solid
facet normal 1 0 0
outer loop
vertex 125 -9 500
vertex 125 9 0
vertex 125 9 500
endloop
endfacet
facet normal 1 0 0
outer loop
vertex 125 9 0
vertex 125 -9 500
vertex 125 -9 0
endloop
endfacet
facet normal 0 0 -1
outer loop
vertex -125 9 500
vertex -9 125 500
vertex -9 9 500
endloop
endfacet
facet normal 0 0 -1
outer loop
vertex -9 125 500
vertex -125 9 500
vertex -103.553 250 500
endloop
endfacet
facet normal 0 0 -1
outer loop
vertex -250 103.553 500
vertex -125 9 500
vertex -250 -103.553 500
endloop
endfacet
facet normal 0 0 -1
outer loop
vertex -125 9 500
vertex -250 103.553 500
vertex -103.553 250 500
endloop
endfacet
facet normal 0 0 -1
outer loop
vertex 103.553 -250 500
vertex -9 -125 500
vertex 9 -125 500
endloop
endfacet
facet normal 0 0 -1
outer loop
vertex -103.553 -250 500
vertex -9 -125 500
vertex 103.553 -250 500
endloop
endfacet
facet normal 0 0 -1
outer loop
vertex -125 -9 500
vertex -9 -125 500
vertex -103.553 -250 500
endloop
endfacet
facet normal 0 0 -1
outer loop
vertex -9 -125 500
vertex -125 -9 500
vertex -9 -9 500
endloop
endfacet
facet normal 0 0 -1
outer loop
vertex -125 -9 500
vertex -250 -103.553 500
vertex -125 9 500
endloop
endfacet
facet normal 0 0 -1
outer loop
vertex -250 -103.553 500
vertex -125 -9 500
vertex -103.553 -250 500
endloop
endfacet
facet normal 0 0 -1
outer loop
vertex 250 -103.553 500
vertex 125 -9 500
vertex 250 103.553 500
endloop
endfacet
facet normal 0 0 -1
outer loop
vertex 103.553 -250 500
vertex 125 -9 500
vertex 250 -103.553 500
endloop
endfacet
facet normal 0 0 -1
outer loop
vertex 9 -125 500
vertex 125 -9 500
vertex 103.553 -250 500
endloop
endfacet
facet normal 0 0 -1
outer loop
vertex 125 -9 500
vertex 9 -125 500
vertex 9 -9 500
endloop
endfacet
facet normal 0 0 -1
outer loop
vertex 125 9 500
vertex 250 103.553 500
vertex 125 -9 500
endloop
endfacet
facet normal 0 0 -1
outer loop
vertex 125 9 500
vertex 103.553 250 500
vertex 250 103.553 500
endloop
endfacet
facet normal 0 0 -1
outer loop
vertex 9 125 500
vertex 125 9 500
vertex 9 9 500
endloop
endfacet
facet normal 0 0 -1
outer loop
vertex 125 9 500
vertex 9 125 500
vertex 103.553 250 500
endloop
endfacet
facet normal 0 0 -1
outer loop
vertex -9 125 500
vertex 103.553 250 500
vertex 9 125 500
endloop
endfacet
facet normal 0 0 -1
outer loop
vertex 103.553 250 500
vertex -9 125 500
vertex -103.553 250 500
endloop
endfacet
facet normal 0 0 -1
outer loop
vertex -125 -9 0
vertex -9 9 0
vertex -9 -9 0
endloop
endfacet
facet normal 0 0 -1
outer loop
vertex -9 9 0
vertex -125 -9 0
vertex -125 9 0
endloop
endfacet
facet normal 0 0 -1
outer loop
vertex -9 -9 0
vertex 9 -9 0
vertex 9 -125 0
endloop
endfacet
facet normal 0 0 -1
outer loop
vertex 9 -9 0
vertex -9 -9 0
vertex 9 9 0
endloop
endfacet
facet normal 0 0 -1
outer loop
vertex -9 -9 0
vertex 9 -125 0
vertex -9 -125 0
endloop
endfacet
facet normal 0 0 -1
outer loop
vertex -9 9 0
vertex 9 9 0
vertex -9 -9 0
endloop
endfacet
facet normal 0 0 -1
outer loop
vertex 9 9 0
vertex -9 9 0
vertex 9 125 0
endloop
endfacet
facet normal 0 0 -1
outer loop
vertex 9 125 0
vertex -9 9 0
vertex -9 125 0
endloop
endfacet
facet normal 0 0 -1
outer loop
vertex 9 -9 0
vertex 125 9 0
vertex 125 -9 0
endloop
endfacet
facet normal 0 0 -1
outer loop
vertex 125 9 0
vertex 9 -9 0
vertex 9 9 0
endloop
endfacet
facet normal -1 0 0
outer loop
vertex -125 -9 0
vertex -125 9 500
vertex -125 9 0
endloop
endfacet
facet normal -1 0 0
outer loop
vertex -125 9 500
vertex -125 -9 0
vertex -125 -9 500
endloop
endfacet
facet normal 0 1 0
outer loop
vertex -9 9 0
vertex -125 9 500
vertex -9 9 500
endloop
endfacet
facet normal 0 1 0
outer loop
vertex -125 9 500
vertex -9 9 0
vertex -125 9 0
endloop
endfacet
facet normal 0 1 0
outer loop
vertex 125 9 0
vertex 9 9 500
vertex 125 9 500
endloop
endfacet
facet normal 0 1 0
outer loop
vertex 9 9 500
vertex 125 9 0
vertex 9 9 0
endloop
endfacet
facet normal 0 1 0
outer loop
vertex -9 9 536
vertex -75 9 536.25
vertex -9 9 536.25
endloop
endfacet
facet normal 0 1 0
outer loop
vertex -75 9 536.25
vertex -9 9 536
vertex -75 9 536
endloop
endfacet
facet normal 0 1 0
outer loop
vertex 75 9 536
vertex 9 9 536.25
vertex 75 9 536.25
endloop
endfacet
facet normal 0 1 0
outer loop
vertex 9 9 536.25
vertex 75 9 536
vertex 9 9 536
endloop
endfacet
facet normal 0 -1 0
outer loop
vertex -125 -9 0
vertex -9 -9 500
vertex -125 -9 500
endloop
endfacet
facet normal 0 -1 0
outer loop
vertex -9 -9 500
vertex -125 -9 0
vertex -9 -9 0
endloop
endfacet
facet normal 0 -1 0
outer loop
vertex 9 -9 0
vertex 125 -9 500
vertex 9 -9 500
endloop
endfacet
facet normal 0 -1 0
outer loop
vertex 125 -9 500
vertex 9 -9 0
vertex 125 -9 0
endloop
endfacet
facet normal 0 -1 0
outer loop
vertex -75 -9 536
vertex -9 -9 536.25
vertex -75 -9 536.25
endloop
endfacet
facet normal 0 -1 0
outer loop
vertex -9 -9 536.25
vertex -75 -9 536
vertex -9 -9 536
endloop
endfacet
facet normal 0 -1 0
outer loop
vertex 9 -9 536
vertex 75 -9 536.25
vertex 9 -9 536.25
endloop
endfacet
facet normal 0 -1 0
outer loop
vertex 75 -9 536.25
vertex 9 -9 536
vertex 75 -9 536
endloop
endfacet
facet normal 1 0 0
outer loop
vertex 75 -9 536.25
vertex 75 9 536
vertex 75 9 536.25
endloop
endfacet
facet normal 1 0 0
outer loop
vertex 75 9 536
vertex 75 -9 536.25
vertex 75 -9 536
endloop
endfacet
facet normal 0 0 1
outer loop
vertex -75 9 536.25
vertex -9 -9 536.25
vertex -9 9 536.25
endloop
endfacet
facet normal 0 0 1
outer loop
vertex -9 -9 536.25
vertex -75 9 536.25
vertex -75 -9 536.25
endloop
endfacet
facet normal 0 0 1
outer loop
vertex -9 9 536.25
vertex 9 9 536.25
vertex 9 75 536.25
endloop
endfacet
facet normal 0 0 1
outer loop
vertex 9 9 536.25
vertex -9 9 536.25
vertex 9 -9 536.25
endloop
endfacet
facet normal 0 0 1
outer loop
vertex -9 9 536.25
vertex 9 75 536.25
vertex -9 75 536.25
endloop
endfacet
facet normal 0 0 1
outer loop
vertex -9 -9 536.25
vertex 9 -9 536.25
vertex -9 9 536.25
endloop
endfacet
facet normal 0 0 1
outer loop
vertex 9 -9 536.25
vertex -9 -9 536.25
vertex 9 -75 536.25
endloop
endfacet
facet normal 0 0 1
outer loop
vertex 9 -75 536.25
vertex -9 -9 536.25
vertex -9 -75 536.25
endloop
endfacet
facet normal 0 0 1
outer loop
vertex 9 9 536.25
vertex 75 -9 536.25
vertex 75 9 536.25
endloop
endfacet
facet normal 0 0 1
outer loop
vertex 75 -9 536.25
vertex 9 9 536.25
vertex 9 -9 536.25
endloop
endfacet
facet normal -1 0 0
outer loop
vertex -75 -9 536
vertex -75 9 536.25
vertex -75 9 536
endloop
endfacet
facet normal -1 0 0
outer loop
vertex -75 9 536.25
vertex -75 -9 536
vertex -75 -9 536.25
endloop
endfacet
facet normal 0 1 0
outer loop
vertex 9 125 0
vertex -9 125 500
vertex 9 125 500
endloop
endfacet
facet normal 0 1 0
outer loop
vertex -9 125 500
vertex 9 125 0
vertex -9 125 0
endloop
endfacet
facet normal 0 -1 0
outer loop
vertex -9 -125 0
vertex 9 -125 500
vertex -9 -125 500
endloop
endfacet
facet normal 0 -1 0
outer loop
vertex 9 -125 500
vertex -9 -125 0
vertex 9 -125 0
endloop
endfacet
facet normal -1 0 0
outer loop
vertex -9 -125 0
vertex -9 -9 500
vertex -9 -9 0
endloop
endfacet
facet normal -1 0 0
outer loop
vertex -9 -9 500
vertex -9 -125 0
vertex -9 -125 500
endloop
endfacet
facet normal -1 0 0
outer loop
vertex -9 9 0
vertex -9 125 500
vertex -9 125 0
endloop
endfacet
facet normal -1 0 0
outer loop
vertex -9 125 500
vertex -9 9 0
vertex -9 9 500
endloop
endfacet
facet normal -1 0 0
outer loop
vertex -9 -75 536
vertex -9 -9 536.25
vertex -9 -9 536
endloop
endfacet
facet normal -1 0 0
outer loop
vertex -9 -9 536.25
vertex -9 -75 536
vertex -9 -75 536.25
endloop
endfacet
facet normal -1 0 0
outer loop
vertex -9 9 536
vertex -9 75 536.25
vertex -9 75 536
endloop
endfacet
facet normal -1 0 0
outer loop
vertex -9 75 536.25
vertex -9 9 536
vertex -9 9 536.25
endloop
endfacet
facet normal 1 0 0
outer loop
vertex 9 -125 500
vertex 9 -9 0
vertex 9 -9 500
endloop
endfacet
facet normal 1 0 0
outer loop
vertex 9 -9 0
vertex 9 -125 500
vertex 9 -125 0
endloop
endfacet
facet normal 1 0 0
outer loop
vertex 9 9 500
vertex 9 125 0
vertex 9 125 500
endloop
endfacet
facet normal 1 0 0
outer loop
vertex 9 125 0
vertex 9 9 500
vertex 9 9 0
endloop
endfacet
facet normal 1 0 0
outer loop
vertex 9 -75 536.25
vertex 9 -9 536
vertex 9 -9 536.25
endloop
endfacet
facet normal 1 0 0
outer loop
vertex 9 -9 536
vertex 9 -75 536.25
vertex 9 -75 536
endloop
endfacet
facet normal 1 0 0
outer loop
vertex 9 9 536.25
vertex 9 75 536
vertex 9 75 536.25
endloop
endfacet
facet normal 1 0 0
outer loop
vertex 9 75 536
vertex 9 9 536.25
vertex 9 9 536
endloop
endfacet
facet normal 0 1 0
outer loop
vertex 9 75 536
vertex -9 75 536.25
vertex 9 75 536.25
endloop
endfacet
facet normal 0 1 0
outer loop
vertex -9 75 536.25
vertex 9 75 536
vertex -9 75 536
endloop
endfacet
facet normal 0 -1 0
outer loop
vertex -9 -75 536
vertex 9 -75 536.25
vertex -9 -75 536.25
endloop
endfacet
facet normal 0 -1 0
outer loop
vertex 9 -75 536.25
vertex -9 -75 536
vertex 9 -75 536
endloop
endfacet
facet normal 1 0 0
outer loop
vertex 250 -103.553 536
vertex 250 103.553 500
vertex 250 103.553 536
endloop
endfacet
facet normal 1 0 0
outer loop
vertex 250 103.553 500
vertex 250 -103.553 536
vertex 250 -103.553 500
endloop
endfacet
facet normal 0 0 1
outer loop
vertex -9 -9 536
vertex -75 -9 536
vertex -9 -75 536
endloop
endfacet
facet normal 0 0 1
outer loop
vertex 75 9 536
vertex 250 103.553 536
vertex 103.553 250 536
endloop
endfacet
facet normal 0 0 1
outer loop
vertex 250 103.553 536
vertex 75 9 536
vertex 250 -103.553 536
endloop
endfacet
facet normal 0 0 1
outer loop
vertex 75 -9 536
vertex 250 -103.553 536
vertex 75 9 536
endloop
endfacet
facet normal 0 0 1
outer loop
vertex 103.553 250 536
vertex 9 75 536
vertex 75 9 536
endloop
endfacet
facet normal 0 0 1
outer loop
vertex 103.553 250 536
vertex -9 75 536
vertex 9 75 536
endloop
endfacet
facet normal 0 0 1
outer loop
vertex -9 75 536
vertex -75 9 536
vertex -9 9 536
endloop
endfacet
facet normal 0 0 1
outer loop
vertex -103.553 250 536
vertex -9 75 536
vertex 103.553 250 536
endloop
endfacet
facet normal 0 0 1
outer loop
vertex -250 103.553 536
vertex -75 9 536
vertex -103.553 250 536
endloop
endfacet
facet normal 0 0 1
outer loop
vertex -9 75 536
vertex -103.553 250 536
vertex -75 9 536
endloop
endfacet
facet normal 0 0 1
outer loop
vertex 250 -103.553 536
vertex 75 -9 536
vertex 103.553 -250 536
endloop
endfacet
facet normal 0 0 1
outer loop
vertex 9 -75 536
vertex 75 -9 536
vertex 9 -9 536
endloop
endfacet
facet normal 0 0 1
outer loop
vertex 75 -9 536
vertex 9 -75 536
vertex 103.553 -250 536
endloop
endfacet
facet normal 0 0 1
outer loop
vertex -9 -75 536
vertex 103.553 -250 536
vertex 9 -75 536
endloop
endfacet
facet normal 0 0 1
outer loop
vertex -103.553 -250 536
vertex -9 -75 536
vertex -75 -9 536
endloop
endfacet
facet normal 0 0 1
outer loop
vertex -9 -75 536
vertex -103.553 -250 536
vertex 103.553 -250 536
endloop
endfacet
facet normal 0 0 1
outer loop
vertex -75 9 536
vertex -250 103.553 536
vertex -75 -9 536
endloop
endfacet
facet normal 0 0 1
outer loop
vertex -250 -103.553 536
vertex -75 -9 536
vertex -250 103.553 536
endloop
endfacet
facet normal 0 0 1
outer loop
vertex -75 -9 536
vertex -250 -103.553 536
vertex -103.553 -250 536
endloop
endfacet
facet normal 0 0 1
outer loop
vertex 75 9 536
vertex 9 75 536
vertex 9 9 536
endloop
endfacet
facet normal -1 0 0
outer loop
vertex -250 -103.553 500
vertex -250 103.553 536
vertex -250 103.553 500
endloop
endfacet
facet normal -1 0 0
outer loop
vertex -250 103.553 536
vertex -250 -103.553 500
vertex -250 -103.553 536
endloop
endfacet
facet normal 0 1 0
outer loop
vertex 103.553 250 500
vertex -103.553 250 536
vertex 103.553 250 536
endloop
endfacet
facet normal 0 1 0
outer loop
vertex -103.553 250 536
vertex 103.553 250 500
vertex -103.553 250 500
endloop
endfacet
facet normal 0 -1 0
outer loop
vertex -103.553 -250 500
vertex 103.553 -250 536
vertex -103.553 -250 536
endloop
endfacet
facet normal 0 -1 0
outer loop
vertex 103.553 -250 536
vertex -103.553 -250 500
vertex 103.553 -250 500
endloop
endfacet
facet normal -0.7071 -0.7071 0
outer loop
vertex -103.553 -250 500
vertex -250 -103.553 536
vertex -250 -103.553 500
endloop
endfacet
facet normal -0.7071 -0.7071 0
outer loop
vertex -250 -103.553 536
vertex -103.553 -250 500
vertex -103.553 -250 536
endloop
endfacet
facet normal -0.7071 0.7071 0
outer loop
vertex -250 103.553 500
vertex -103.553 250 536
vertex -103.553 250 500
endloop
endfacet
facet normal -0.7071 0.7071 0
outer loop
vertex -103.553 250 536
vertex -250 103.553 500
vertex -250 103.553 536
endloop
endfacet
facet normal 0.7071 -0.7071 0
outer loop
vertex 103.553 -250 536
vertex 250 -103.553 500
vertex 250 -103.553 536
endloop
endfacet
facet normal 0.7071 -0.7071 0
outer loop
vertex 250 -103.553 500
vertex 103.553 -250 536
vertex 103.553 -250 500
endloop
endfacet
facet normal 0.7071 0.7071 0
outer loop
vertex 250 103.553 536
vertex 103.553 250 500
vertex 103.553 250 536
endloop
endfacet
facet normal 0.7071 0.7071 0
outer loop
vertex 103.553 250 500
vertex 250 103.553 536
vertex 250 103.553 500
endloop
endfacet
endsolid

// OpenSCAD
w=330; //mm
d=330;
t=150; //thickness

h=420; //height
h_frame=350;

leg_t = 20; //leg thickness


legs_h = 500;
legs_w = 250;
mat_t = 18; //material thickness

cylinder_rad = legs_w/2-15;
top_rad = 250;

top_thickness = 2*mat_t;

module leg(x,y, a) {
    
    rotate([0,0,a]) {
        difference() {
            translate([x,y,legs_h/2]){
                cube(size = [legs_w, mat_t,legs_h], center = true); //thin legs
            }
            translate([1050, 1+mat_t/2, legs_h/2]){
                rotate([90,0,0]) {
                    cylinder(h=mat_t+2, r=1000);
                }
            }
        }
    }
}

module leg2(x,y, a) {
    color("BurlyWood") {
        rotate([0,0,a]) {

            translate([x,y,legs_h/2]){
                cube(size = [legs_w, mat_t,legs_h], center = true);
                translate([0,0,legs_h/2+top_thickness/2]){
                    cube(size = [legs_w*(3/5), mat_t,top_thickness+0.5], center = true);
                }
            }
        }
    }
}


module cyl(h, r) {
    translate([0,0,h]){
        cylinder(h=top_thickness, r=r);
    }
}

module hex_top(h, r) {
    translate([0,0,h+top_thickness/2]){
        intersection(){
            cube(size = [top_rad*2, top_rad*2,top_thickness], center = true);
            rotate([0,0,45]) {
                cube(size = [top_rad*2, top_rad*2,top_thickness], center = true);
            }
        }
    }
}



leg2(0 ,0, 0);
leg2(0, 0, 90);



//Middle supporting disks
//cyl(legs_h*(1/4), cylinder_rad);
//cyl(legs_h*(3/4), cylinder_rad);

//Top
//cyl(legs_h, top_rad);
hex_top(legs_h, top_rad);
